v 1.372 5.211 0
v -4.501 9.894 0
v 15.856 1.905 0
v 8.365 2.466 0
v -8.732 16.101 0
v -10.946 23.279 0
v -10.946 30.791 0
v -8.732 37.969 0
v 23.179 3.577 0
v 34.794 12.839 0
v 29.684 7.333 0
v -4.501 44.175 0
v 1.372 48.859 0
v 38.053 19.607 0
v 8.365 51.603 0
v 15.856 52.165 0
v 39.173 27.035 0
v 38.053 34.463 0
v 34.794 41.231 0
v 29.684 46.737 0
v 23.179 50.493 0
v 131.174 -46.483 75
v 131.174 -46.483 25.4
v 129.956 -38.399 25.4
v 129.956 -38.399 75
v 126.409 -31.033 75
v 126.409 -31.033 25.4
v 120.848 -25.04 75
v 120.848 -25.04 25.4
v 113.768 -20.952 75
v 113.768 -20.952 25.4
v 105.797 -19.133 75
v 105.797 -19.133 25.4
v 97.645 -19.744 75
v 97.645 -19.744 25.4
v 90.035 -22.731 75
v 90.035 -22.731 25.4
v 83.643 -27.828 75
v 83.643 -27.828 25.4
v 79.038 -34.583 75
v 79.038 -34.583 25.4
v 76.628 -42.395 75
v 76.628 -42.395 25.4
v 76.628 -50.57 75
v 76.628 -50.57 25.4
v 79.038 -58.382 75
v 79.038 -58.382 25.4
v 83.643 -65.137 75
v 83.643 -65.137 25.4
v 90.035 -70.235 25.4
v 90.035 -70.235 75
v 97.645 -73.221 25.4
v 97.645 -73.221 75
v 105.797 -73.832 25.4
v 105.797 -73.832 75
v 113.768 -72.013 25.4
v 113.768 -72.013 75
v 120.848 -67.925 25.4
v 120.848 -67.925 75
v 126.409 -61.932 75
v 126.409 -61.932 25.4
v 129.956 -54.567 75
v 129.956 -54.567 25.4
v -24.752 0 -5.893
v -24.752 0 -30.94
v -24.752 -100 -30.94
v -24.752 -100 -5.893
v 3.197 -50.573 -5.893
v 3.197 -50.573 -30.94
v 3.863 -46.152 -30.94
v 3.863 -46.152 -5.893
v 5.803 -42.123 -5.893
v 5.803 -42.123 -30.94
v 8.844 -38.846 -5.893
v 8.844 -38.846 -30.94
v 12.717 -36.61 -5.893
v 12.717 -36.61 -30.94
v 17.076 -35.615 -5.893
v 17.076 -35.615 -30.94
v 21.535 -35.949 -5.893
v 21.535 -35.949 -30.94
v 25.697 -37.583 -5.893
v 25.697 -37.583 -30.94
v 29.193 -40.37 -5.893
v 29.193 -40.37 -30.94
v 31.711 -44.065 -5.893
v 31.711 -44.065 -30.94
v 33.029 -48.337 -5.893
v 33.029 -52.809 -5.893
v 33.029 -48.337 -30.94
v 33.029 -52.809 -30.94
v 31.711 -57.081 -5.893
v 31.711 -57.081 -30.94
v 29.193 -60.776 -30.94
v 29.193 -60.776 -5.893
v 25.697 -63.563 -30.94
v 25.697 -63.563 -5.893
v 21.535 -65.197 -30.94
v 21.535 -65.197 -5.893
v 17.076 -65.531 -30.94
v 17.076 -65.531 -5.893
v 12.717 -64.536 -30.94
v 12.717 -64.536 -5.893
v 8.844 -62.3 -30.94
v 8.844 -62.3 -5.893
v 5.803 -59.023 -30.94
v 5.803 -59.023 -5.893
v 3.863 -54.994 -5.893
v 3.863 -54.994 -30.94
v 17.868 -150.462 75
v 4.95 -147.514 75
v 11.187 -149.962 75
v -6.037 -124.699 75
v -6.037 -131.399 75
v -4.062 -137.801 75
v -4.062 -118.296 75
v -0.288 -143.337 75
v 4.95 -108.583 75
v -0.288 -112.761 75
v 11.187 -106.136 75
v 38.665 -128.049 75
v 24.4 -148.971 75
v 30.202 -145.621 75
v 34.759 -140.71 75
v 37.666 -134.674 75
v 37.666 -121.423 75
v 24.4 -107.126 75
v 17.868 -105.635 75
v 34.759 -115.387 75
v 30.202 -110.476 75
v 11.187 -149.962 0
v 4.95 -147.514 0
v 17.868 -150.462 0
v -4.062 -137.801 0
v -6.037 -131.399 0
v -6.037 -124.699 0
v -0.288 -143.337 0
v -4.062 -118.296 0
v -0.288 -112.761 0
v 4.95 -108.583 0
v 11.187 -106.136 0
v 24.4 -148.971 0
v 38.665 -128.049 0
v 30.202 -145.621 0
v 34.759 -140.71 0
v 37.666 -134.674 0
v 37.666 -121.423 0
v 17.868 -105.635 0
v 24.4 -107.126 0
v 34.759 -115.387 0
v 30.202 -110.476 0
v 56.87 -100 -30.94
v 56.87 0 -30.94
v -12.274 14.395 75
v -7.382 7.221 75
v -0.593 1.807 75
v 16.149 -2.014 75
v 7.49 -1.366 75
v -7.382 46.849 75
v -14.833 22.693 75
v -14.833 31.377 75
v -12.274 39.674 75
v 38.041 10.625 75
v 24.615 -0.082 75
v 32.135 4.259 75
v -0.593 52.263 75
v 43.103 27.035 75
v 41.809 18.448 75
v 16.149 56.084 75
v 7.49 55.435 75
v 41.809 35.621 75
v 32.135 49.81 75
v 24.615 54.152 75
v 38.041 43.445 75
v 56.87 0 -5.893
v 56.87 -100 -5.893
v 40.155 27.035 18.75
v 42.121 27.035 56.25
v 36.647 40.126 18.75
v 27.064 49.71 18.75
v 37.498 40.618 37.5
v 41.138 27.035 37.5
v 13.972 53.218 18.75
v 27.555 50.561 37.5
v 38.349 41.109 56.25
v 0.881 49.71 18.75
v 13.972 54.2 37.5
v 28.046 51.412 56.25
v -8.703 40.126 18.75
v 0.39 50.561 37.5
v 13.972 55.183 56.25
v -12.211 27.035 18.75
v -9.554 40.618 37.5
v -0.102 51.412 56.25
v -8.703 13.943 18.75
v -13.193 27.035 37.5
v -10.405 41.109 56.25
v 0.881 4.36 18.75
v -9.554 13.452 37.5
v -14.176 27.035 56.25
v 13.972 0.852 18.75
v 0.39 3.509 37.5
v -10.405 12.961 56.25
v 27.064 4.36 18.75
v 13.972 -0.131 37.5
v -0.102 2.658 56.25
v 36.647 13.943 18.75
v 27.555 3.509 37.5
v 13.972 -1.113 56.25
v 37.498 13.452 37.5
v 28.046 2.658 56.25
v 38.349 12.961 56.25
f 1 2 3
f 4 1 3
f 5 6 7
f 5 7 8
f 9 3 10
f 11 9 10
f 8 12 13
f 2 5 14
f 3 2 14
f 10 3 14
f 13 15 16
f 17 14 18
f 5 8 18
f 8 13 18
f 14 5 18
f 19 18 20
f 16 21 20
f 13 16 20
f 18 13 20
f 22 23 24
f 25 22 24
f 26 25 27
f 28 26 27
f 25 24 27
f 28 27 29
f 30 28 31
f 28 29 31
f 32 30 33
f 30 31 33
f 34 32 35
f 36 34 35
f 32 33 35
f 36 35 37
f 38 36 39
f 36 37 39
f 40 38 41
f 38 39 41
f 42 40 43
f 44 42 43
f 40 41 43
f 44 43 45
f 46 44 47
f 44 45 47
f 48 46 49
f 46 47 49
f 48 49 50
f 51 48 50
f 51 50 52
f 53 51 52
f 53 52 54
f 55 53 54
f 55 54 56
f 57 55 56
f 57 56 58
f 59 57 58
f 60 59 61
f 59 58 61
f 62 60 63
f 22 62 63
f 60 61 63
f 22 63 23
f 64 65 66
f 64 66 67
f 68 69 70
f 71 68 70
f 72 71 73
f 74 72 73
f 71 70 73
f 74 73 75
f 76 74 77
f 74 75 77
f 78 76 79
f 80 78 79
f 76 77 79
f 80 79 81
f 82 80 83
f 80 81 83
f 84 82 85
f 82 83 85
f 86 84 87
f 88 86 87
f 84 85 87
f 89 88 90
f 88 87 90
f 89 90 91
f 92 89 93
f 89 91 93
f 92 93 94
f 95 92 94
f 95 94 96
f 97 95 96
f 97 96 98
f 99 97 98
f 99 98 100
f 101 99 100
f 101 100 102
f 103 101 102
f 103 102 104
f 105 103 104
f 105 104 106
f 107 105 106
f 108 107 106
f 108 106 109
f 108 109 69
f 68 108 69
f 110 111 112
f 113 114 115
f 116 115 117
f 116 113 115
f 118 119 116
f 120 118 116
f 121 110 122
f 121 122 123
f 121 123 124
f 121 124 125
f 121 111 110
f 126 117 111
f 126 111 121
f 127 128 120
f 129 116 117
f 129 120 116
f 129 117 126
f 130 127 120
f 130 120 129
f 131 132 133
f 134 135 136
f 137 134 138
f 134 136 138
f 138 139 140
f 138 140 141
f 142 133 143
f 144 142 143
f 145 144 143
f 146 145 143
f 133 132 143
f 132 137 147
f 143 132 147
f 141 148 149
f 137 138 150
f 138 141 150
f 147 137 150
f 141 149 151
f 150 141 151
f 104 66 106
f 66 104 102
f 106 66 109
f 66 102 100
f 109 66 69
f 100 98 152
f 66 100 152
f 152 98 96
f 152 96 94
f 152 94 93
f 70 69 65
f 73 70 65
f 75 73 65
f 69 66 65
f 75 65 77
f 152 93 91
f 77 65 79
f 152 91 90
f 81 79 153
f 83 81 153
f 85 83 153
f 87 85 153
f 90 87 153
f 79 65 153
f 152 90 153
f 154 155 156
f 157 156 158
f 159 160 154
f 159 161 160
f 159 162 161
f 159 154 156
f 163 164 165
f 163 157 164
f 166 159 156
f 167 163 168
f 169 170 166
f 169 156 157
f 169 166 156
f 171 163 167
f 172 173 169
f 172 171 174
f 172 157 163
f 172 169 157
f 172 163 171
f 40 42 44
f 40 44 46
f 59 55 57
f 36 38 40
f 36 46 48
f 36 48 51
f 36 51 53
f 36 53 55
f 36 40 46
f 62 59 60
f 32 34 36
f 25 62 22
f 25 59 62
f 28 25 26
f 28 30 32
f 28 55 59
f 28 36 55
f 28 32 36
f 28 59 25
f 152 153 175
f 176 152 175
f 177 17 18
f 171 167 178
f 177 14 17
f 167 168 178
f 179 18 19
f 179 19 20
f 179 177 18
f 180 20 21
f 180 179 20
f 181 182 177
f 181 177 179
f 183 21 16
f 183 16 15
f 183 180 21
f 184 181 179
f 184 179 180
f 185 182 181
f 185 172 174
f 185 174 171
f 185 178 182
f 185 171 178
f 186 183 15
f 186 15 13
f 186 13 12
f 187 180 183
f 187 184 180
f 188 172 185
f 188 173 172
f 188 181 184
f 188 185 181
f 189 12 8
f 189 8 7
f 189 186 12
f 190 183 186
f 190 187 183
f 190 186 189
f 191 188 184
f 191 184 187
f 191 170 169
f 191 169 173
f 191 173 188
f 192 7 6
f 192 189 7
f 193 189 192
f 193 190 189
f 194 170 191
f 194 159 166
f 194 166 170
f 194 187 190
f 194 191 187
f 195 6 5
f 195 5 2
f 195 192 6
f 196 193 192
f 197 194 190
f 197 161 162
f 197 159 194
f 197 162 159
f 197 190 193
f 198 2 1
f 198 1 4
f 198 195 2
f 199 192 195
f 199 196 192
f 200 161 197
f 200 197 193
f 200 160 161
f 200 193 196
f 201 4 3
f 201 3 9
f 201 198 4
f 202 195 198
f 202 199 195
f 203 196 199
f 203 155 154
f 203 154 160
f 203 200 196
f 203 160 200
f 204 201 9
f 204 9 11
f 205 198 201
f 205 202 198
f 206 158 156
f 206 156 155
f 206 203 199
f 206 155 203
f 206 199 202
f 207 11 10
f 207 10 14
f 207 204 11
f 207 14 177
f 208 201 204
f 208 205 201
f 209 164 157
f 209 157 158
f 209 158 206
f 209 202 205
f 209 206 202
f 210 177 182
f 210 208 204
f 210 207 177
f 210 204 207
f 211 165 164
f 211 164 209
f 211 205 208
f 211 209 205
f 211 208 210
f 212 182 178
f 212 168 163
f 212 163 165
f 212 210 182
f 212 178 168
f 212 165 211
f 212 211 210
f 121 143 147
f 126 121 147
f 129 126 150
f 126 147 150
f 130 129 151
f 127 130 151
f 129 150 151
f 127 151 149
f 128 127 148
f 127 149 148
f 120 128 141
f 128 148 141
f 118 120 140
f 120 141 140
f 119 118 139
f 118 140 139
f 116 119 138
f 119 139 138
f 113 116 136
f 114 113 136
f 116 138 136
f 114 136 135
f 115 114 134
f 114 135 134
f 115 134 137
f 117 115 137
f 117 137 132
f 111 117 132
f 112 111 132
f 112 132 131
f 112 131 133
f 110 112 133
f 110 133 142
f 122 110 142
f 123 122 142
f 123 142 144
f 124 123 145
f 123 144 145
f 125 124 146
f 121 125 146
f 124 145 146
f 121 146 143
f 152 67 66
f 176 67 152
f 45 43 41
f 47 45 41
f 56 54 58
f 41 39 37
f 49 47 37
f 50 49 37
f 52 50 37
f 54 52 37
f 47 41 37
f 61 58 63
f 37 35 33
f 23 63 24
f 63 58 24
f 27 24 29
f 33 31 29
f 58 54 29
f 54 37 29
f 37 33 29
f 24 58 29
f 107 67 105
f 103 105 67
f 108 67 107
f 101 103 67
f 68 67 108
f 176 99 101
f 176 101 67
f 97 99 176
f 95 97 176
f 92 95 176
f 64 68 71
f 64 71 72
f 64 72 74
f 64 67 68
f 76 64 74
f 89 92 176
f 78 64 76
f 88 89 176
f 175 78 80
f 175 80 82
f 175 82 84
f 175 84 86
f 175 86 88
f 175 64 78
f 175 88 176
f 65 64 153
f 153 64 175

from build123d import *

# Parameters (mm, degrees)
F0_W     = 81.6221088171
F0_H     = 25.0464975834
F1_DEPTH = 100
F2_R     = 25.200211847
F3_DEPTH = 75
F3_TAPER = -3
F4_R     = 22.4765508503
F6_DEPTH = 75
F8_START = 25.4
F7_R     = 27.4263111982
F8_DEPTH = 49.6
F10_D    = 30


with BuildPart() as f1:
    # F0 (on Front) → F1 (new body)
    with BuildSketch(Plane.XZ):
        with Locations((16.0592272878, -18.4165388346)):
            Rectangle(F0_W, F0_H)
    extrude(amount=F1_DEPTH)

    # F10 (through all)
    with Locations(Plane.XY.offset(-5.8932900429)):
        with Locations((18.1968174875, -50.5730137229)):
            Hole(F10_D / 2)


with BuildPart() as f3:
    # F2 (on Top) → F3 (new body)
    with BuildSketch(Plane.XY):
        with Locations((13.9723531902, 27.0348433405)):
            Circle(F2_R)
    extrude(amount=F3_DEPTH, taper=F3_TAPER)


with BuildPart() as f6:
    # F4 (on Top) → F6 (new body)
    with BuildSketch(Plane.XY):
        with Locations((16.1882545799, -128.048568964)):
            Circle(F4_R)
    extrude(amount=F6_DEPTH)


with BuildPart() as f8:
    # F7 (on Top) → F8 (new body)
    with BuildSketch(Plane.XY.offset(F8_START)):
        with Locations((103.7478968501, -46.4826561511)):
            Circle(F7_R)
    extrude(amount=F8_DEPTH)


solid = Compound([f1.part, f3.part, f6.part, f8.part])
